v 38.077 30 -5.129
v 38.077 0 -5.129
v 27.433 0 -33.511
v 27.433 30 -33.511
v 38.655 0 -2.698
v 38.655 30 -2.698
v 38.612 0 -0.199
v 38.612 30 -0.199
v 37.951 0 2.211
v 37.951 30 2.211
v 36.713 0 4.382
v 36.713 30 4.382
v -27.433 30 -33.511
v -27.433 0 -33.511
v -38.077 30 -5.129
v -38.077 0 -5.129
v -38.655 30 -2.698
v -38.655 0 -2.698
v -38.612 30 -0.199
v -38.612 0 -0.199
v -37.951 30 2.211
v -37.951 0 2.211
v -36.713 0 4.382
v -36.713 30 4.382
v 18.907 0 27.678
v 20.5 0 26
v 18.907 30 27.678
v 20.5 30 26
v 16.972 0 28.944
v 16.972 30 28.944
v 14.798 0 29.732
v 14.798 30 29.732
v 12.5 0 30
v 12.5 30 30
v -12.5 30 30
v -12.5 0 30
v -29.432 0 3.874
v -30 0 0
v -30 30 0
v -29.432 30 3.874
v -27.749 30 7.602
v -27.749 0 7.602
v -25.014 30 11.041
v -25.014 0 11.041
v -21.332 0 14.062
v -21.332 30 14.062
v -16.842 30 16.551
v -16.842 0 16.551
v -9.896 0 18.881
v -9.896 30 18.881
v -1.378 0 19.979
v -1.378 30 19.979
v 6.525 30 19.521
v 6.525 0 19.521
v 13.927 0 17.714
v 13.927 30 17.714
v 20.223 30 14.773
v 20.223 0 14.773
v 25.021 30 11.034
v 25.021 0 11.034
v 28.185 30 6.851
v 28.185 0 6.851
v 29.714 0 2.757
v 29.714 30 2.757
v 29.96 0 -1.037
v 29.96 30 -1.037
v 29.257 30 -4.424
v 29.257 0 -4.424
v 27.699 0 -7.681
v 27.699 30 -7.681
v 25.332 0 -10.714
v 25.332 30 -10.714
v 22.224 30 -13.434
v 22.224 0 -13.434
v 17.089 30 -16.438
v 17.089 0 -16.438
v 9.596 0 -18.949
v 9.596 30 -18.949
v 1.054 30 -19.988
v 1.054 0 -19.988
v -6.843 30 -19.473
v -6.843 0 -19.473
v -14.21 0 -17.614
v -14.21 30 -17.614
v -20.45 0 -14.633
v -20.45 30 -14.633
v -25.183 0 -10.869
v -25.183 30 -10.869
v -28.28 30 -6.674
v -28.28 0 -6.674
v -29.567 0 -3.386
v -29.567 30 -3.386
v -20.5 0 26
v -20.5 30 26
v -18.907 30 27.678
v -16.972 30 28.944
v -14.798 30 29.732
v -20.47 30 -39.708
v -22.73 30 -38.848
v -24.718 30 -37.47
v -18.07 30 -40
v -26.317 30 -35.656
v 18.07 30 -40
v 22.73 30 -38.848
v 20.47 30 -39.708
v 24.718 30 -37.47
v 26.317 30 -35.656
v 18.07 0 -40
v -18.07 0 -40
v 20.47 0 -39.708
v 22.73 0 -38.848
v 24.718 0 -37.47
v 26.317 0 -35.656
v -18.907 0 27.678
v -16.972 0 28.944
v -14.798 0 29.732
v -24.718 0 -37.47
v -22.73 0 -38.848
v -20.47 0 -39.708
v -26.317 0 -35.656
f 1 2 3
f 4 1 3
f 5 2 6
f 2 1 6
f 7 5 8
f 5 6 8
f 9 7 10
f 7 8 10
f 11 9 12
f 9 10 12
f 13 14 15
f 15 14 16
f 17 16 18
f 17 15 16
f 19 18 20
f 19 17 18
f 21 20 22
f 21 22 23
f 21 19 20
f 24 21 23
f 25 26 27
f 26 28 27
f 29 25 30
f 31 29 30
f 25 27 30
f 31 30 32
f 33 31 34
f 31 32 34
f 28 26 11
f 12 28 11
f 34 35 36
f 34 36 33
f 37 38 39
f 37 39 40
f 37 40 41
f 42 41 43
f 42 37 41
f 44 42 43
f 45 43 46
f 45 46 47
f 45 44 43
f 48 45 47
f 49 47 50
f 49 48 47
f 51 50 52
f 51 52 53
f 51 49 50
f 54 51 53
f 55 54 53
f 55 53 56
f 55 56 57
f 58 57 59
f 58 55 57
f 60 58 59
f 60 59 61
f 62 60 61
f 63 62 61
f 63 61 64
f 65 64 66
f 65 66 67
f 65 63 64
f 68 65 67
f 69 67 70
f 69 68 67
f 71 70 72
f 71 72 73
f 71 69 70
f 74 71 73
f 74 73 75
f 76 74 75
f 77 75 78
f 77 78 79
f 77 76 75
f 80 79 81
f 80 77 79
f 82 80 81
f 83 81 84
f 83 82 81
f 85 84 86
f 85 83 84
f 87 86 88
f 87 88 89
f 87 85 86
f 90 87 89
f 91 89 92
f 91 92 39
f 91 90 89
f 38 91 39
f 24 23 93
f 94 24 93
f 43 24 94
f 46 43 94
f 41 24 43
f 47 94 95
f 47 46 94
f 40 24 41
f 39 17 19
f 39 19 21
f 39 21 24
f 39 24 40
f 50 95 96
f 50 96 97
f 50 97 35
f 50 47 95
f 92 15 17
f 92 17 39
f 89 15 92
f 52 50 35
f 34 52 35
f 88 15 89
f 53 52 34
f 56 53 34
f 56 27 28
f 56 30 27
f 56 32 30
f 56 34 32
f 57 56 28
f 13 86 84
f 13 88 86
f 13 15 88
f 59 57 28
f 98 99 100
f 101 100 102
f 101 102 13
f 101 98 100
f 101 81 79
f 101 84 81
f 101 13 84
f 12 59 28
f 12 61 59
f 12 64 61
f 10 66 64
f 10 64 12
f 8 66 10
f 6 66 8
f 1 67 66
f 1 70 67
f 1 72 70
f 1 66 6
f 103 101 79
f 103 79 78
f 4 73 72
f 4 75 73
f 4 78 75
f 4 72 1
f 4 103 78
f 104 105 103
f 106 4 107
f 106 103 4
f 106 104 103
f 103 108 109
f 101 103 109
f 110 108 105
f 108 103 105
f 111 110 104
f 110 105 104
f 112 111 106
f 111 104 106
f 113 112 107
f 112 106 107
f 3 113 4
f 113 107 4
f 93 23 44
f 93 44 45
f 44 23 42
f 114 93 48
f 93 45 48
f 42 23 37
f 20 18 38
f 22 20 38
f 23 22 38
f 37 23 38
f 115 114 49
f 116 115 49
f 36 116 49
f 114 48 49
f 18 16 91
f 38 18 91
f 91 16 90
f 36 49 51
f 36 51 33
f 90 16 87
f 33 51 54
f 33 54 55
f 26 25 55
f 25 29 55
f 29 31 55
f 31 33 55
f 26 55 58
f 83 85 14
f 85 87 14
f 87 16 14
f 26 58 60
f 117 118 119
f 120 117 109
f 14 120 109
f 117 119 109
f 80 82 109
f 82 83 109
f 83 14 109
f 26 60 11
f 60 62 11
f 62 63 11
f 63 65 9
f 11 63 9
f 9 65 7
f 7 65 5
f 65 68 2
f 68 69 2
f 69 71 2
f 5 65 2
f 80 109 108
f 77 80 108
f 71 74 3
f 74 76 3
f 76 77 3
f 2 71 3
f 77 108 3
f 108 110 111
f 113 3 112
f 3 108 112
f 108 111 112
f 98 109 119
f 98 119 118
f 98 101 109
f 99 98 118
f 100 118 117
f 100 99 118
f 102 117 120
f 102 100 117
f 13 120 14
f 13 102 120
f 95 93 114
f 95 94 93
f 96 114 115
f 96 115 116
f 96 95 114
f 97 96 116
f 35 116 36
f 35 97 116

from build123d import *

# Parameters (mm, degrees)
SKETCH1_RX          = 30
SKETCH1_RY          = 20
BOSS_EXTRUDE1_DEPTH = 30
FILLET1_R           = 10


with BuildPart() as part:
    # Sketch1 → Boss-Extrude1 (new body)
    with BuildSketch(Plane(origin=(0, 0, 0), x_dir=(1, 0, 0), z_dir=(0, 1, 0))):
        Polygon((25, 40), (-25, 40), (-40, 0), (-17.5, -30), (17.5, -30), (40, 0), align=None)
        with Locations(Location((0, 0), (0, 0, -180))):
            Ellipse(SKETCH1_RX, SKETCH1_RY, mode=Mode.SUBTRACT)
    extrude(amount=BOSS_EXTRUDE1_DEPTH)

    # Fillet1
    fillet1_edges = [part.edges().sort_by_distance(p)[0] for p in [
        (-25, 15, -40),
        (25, 15, -40),
        (40, 15, 0),
        (17.5, 15, 30),
        (-17.5, 15, 30),
        (-40, 15, 0),
    ]]
    fillet(fillet1_edges, radius=FILLET1_R)


solid = part.part
